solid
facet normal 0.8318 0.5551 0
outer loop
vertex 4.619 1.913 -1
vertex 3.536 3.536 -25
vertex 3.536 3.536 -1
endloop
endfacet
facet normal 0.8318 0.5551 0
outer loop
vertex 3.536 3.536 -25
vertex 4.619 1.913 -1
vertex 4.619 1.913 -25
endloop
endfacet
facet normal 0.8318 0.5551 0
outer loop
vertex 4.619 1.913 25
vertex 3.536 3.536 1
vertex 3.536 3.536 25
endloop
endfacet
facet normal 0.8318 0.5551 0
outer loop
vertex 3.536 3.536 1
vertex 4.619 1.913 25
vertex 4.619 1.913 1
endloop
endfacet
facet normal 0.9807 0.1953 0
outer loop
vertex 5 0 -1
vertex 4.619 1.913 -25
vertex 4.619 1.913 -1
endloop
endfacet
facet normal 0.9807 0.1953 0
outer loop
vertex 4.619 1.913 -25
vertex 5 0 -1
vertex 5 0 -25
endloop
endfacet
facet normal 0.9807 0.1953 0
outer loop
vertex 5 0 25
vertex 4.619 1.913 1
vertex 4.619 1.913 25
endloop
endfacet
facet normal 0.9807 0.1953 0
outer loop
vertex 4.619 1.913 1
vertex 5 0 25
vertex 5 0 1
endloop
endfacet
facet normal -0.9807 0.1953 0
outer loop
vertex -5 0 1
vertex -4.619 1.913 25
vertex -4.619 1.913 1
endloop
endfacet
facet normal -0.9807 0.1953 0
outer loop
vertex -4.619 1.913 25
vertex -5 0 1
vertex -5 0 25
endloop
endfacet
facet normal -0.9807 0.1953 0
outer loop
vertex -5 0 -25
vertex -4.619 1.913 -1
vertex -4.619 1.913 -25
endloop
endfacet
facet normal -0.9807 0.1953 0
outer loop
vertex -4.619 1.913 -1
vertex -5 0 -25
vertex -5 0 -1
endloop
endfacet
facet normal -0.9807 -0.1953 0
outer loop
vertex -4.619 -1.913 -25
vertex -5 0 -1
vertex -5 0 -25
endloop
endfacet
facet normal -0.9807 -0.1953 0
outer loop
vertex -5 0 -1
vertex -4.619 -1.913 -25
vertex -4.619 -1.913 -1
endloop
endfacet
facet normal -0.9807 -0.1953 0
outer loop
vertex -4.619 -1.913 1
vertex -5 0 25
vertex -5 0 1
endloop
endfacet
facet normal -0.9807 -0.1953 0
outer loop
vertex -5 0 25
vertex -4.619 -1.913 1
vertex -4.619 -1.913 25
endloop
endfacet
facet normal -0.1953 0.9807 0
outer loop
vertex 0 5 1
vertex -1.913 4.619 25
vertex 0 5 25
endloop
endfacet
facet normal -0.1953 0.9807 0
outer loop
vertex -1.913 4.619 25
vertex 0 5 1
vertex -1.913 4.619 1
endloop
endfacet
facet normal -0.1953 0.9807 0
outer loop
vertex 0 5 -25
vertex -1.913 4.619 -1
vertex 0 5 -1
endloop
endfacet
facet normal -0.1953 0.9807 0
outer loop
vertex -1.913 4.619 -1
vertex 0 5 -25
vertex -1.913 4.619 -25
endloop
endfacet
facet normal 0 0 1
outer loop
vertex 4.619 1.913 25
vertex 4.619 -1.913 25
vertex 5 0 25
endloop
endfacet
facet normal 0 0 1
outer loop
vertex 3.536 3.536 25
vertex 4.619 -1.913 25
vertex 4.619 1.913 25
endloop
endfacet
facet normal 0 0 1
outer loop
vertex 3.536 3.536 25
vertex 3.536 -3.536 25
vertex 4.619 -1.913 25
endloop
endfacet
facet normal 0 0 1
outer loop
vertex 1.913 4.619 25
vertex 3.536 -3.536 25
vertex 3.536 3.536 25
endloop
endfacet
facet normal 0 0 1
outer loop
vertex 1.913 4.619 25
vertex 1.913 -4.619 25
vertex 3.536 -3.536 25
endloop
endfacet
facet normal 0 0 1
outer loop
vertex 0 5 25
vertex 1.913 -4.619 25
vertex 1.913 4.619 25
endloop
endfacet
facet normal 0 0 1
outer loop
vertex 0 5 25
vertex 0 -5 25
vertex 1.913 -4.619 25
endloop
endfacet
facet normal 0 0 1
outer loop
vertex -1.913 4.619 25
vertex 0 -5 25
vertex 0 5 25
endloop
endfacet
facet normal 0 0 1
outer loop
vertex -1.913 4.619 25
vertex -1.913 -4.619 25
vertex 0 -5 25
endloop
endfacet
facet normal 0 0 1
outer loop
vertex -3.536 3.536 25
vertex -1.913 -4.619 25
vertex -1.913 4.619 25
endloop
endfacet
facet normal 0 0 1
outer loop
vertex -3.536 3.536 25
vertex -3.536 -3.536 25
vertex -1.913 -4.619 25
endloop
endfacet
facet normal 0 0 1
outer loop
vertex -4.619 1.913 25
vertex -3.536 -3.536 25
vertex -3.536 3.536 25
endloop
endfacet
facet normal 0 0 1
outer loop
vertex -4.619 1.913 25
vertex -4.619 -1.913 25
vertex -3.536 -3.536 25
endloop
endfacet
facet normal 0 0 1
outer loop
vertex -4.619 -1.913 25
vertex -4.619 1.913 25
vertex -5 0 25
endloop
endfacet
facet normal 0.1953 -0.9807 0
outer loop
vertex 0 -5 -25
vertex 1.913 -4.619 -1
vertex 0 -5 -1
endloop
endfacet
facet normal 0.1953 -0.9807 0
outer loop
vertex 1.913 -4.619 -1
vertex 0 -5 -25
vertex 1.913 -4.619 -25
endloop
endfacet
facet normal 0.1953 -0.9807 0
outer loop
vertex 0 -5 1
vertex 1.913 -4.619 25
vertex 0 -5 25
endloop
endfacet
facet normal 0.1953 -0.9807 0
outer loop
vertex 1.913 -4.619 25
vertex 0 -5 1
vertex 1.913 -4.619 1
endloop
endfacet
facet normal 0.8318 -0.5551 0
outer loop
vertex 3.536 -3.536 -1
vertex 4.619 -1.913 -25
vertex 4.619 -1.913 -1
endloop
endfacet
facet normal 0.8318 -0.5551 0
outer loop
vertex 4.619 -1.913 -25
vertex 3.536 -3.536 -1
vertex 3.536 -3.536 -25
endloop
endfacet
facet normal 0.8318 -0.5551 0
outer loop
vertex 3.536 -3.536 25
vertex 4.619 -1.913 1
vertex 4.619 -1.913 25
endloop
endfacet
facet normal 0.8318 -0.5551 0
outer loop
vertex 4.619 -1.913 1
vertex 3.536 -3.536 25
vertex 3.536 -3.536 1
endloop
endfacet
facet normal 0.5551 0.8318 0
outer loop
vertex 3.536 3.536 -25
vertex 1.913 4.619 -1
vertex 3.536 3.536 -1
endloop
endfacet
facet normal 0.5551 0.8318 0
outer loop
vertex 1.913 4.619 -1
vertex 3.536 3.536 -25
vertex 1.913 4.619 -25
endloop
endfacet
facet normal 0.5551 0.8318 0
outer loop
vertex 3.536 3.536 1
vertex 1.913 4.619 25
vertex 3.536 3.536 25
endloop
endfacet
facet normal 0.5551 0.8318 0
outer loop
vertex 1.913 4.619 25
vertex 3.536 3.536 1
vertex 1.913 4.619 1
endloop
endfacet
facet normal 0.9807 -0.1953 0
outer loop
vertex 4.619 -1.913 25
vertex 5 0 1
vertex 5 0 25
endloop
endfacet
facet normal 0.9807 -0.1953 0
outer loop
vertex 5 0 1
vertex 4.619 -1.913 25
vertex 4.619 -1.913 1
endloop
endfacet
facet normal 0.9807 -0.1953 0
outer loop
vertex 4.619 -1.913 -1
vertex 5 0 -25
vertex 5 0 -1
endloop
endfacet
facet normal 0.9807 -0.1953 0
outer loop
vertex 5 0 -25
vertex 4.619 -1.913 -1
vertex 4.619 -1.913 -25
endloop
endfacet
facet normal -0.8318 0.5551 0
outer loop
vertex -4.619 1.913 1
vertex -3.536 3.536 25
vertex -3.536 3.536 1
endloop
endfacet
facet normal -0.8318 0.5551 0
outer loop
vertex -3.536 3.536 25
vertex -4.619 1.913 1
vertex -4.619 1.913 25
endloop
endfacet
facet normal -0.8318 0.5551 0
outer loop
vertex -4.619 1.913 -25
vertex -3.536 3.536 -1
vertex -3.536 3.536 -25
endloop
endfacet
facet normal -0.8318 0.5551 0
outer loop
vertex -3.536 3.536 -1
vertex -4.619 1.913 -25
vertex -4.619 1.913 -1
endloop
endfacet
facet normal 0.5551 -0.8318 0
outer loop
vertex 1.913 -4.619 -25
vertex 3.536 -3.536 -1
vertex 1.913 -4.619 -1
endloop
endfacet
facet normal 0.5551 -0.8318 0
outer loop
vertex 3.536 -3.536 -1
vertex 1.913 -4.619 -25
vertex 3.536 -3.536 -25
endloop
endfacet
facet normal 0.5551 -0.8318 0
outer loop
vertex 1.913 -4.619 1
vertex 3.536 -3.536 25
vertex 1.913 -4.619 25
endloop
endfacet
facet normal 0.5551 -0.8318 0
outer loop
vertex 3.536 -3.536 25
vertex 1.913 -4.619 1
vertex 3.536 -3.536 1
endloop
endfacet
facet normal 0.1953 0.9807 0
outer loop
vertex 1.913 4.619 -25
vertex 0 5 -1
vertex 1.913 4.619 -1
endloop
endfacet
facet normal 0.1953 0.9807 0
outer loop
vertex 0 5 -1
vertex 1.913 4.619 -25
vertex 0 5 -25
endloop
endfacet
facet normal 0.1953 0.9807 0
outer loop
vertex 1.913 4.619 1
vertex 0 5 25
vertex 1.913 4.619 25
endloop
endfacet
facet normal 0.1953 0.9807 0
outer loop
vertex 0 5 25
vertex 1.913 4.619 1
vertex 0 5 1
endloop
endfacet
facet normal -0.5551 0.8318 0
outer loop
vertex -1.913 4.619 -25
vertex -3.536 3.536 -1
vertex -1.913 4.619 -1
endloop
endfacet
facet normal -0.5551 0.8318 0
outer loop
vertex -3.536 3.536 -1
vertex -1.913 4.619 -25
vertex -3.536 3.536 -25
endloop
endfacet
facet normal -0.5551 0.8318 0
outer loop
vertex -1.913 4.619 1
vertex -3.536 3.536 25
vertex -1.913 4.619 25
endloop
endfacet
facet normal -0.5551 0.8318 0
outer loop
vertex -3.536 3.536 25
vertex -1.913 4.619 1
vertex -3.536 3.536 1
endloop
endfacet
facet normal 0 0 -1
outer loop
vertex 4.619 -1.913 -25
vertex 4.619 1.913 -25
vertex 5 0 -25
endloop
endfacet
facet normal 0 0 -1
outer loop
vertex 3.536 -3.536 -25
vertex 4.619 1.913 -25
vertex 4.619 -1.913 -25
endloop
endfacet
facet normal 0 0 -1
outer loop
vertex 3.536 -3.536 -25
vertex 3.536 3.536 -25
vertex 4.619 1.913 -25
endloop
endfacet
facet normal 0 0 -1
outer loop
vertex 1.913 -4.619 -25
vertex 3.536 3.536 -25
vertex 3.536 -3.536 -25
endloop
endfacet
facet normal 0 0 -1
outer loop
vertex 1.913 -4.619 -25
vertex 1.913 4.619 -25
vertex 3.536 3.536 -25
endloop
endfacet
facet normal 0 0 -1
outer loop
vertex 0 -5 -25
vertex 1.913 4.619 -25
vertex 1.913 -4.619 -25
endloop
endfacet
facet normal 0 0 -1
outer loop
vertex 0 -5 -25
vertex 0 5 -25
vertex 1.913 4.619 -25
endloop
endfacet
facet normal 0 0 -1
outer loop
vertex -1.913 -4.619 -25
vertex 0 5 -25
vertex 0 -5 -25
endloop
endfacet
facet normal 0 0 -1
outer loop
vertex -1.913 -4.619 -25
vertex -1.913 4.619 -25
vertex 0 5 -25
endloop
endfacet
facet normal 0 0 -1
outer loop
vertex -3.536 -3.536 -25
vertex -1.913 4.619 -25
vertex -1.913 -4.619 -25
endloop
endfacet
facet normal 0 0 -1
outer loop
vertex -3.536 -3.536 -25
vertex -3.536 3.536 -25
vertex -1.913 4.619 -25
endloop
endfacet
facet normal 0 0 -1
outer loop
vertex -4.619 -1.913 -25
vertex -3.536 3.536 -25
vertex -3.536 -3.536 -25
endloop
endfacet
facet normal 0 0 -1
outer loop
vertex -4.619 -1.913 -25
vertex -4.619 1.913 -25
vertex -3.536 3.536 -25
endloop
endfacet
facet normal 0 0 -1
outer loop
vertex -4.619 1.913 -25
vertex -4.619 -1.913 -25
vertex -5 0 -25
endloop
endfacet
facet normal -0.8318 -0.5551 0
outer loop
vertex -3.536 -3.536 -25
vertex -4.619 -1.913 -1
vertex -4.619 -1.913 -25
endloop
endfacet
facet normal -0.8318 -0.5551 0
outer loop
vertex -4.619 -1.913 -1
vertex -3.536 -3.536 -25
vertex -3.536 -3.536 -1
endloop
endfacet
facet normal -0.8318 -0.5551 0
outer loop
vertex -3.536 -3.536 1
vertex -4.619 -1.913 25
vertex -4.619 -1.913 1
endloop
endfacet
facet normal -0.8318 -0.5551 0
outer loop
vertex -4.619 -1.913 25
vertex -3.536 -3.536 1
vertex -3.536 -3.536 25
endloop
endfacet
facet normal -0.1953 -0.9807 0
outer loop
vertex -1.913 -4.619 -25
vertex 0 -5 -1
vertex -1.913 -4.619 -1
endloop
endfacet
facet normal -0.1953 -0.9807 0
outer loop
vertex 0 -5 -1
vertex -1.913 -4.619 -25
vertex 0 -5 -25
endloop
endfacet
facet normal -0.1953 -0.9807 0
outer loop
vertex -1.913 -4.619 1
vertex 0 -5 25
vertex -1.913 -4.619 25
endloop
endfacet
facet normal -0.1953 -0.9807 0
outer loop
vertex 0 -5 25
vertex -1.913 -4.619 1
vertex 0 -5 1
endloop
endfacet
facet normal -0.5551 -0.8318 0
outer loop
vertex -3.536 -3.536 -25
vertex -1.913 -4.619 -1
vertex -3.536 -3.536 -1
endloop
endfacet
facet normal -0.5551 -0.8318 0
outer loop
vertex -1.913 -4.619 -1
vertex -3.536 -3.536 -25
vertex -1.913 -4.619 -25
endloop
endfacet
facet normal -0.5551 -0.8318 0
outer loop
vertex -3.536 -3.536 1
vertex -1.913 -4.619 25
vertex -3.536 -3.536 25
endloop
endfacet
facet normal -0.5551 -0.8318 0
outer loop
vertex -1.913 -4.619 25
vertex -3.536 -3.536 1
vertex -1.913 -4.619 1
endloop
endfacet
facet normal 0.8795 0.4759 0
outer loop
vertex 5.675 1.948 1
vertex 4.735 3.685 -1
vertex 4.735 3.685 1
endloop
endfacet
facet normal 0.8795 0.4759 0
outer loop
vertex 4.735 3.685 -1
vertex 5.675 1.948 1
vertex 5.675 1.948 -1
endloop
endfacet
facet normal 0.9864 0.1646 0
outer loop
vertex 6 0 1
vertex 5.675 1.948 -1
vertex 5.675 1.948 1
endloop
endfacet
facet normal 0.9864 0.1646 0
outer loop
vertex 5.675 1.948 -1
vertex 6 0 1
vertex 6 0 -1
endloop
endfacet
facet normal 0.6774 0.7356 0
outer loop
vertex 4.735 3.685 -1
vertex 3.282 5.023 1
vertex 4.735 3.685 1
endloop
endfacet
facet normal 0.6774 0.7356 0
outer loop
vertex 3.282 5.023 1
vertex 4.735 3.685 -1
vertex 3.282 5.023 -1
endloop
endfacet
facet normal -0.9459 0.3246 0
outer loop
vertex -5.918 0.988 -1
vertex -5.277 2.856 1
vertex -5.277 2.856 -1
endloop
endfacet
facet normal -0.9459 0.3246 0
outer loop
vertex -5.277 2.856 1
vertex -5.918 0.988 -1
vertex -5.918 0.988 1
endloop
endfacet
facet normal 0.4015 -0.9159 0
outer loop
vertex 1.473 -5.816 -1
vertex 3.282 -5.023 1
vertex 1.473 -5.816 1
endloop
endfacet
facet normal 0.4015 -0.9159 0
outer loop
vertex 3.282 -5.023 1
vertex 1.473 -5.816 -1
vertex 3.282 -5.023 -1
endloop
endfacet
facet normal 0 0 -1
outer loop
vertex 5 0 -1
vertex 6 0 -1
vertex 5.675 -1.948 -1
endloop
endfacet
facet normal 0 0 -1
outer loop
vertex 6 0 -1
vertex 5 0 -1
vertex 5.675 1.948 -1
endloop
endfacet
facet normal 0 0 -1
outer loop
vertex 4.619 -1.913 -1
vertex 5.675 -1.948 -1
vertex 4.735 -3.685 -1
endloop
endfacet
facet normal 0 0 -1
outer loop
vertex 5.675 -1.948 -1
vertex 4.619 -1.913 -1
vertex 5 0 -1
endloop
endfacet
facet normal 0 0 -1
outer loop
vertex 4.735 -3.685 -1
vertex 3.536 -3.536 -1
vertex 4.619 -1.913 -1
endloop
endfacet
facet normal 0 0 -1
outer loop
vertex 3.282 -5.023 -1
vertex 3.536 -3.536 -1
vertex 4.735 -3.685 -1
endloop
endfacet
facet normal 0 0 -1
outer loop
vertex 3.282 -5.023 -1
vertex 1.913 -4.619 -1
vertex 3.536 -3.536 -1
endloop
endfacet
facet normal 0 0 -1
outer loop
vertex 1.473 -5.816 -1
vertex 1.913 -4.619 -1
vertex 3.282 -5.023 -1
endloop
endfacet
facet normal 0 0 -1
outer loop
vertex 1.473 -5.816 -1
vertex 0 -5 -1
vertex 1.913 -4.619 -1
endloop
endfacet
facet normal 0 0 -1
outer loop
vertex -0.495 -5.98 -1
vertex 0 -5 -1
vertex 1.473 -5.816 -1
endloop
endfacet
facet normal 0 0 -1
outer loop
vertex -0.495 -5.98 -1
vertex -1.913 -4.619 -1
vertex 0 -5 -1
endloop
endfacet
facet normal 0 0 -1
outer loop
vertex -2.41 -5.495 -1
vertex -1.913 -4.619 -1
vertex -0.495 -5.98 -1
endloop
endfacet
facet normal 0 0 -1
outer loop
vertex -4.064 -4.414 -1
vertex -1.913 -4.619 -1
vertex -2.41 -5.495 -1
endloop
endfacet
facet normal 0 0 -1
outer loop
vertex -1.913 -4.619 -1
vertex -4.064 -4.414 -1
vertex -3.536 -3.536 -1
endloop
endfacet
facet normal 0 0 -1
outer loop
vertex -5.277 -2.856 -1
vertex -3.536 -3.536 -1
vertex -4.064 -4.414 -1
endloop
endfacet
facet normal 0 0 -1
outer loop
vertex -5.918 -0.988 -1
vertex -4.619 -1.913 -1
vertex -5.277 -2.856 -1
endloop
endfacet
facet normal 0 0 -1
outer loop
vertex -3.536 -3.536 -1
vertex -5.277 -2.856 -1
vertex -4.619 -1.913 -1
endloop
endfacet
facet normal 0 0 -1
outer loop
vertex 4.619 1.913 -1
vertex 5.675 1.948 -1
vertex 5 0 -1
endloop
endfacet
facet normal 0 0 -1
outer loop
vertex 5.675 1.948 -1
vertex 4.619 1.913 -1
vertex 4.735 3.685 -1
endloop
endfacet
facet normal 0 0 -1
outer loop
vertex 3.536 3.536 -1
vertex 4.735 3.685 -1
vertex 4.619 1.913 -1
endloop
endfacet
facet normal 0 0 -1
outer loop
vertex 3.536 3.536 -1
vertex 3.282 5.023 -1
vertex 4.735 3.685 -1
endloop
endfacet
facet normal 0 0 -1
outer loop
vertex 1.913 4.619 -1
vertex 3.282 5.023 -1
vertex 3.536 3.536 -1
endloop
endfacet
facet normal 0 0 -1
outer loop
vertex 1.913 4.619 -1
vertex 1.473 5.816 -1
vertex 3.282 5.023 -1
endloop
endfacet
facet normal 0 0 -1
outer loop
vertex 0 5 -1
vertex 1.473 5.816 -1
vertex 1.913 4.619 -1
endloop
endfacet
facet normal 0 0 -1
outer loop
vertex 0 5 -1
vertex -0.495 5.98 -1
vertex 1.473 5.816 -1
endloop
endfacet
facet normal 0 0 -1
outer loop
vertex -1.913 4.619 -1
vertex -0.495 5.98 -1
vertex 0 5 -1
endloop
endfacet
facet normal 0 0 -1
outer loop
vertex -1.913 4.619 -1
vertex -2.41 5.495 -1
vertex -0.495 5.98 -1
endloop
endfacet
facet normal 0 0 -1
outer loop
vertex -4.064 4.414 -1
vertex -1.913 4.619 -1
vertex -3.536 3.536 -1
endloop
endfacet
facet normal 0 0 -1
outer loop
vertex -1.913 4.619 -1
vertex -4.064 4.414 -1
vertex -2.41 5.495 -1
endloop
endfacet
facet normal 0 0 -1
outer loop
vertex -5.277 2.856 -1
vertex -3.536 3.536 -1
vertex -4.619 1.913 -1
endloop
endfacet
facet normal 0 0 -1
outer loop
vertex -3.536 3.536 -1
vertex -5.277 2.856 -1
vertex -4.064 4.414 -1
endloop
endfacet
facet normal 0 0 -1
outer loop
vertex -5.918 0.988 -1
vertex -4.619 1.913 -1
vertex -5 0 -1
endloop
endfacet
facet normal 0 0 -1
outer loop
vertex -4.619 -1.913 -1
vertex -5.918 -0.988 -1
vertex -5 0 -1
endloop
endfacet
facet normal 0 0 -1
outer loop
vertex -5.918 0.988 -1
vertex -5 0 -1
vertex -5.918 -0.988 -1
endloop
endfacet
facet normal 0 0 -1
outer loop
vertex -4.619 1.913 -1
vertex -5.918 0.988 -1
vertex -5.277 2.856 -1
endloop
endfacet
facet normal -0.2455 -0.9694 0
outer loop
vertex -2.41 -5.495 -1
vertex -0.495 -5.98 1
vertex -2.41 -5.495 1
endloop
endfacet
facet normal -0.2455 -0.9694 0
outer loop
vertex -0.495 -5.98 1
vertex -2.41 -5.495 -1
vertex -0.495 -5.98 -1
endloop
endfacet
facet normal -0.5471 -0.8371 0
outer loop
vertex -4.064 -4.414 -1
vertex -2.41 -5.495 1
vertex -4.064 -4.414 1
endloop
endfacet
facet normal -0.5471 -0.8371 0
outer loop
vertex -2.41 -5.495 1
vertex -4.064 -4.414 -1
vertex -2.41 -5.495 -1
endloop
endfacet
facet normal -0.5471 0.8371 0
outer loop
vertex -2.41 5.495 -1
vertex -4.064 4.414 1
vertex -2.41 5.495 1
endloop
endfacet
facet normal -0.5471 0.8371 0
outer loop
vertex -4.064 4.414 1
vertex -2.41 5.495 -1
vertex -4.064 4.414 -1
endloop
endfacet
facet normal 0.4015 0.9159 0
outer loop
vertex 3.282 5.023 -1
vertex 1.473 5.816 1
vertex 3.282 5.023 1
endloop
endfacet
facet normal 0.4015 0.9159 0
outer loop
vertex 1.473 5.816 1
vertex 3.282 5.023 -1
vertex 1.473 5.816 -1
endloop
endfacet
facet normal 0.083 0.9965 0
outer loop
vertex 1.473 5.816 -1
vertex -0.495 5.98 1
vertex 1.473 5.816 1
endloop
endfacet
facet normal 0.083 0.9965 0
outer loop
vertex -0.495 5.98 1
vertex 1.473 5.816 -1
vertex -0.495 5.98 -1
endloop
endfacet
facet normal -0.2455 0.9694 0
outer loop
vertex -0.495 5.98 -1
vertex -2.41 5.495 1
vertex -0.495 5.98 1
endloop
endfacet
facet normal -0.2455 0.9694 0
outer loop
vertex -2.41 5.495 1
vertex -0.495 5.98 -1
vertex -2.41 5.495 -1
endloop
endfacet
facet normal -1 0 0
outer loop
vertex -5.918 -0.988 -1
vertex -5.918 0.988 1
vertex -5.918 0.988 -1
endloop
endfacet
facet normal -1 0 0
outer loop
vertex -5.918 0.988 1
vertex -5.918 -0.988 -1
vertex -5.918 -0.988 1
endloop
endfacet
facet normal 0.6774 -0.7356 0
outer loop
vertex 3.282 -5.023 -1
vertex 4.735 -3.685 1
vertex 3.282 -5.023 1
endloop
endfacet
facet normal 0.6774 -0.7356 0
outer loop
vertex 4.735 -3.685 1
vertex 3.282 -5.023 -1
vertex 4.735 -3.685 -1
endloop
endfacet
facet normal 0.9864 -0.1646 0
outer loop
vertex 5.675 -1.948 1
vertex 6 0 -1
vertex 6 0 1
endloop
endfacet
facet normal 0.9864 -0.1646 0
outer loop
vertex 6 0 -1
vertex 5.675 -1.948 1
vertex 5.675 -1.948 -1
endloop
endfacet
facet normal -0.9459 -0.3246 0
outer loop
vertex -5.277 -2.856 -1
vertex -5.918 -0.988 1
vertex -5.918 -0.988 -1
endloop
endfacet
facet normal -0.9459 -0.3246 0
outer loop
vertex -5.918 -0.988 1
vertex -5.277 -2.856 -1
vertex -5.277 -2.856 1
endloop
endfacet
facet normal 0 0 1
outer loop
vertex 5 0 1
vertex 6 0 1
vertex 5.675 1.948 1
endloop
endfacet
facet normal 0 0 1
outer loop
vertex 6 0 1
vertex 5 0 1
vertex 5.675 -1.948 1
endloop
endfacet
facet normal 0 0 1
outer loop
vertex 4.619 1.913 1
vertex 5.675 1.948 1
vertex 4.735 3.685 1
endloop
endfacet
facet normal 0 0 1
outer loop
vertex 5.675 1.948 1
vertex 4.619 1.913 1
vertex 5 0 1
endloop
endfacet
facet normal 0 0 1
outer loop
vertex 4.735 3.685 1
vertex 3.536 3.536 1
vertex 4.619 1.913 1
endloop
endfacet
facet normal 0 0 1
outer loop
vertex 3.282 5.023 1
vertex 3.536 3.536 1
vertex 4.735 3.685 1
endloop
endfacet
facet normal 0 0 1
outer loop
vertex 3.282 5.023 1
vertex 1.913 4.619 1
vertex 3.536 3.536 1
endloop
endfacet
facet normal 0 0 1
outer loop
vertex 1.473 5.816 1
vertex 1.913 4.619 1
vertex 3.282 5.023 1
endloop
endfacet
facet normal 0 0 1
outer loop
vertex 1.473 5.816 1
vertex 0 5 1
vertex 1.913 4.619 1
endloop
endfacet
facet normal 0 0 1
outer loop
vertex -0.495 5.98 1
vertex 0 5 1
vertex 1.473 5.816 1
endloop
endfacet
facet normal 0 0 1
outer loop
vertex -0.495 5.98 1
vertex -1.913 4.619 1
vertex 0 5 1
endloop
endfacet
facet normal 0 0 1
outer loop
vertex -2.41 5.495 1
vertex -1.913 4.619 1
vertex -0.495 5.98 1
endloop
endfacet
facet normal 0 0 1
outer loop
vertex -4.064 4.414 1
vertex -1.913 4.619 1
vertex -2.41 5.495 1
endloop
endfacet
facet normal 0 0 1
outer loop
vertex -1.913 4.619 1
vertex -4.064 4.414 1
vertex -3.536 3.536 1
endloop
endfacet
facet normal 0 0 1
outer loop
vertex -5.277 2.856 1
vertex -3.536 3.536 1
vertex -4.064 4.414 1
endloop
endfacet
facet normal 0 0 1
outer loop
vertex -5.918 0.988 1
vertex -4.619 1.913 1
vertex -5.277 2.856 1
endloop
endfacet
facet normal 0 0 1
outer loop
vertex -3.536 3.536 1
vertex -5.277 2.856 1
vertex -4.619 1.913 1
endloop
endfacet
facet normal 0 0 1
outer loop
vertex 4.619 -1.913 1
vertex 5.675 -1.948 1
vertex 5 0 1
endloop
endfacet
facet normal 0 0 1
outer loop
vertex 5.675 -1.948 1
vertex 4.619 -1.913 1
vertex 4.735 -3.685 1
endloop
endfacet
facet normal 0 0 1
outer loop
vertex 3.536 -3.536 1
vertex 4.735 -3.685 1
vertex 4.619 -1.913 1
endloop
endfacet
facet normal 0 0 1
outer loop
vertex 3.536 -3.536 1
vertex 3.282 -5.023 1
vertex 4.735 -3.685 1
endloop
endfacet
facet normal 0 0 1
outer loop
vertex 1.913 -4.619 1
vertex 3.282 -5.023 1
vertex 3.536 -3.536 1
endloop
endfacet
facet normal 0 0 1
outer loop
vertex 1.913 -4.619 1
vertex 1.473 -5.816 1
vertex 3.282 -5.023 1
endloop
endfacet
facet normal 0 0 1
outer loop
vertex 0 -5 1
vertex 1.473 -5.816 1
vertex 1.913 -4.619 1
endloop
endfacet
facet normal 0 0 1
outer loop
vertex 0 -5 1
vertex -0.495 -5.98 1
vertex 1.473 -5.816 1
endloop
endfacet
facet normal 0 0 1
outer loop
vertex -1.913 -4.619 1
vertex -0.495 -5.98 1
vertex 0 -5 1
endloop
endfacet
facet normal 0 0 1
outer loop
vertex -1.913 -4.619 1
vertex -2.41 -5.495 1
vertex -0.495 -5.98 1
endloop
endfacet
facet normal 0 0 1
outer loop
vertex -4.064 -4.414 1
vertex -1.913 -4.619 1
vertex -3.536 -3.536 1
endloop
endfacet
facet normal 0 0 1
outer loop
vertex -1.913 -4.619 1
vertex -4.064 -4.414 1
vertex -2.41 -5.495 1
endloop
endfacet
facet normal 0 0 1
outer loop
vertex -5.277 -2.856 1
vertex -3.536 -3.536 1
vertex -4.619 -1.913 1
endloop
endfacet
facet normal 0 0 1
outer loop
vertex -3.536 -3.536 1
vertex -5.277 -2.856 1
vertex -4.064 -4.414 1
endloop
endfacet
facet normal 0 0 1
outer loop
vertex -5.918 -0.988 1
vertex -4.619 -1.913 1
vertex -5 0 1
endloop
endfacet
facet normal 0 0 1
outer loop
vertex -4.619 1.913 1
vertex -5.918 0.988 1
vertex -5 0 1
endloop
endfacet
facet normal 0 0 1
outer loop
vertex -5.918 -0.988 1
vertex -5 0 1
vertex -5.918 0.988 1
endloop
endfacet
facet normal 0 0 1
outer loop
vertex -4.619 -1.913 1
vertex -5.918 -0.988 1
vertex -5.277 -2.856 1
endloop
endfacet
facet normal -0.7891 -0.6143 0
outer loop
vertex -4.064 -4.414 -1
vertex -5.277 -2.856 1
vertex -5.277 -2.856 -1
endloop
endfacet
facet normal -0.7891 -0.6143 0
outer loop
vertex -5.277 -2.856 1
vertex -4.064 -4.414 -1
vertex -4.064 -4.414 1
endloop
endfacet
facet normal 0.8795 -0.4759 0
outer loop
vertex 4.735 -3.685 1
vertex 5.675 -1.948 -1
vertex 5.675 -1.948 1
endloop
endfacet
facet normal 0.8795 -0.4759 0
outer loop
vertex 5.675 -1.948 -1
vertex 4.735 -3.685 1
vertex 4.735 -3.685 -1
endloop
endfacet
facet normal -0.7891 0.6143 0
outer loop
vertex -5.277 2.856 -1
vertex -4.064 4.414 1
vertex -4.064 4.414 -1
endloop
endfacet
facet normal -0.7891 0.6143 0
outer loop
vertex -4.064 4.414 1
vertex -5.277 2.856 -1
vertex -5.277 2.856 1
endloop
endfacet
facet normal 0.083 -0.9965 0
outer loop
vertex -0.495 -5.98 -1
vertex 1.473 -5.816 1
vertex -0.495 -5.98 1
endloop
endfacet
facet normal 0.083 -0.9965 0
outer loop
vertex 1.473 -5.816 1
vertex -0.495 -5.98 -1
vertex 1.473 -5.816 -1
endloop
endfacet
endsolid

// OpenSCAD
cylinder(h=50,d=10,center=true);
cylinder(h=2,d=12,center=true);
